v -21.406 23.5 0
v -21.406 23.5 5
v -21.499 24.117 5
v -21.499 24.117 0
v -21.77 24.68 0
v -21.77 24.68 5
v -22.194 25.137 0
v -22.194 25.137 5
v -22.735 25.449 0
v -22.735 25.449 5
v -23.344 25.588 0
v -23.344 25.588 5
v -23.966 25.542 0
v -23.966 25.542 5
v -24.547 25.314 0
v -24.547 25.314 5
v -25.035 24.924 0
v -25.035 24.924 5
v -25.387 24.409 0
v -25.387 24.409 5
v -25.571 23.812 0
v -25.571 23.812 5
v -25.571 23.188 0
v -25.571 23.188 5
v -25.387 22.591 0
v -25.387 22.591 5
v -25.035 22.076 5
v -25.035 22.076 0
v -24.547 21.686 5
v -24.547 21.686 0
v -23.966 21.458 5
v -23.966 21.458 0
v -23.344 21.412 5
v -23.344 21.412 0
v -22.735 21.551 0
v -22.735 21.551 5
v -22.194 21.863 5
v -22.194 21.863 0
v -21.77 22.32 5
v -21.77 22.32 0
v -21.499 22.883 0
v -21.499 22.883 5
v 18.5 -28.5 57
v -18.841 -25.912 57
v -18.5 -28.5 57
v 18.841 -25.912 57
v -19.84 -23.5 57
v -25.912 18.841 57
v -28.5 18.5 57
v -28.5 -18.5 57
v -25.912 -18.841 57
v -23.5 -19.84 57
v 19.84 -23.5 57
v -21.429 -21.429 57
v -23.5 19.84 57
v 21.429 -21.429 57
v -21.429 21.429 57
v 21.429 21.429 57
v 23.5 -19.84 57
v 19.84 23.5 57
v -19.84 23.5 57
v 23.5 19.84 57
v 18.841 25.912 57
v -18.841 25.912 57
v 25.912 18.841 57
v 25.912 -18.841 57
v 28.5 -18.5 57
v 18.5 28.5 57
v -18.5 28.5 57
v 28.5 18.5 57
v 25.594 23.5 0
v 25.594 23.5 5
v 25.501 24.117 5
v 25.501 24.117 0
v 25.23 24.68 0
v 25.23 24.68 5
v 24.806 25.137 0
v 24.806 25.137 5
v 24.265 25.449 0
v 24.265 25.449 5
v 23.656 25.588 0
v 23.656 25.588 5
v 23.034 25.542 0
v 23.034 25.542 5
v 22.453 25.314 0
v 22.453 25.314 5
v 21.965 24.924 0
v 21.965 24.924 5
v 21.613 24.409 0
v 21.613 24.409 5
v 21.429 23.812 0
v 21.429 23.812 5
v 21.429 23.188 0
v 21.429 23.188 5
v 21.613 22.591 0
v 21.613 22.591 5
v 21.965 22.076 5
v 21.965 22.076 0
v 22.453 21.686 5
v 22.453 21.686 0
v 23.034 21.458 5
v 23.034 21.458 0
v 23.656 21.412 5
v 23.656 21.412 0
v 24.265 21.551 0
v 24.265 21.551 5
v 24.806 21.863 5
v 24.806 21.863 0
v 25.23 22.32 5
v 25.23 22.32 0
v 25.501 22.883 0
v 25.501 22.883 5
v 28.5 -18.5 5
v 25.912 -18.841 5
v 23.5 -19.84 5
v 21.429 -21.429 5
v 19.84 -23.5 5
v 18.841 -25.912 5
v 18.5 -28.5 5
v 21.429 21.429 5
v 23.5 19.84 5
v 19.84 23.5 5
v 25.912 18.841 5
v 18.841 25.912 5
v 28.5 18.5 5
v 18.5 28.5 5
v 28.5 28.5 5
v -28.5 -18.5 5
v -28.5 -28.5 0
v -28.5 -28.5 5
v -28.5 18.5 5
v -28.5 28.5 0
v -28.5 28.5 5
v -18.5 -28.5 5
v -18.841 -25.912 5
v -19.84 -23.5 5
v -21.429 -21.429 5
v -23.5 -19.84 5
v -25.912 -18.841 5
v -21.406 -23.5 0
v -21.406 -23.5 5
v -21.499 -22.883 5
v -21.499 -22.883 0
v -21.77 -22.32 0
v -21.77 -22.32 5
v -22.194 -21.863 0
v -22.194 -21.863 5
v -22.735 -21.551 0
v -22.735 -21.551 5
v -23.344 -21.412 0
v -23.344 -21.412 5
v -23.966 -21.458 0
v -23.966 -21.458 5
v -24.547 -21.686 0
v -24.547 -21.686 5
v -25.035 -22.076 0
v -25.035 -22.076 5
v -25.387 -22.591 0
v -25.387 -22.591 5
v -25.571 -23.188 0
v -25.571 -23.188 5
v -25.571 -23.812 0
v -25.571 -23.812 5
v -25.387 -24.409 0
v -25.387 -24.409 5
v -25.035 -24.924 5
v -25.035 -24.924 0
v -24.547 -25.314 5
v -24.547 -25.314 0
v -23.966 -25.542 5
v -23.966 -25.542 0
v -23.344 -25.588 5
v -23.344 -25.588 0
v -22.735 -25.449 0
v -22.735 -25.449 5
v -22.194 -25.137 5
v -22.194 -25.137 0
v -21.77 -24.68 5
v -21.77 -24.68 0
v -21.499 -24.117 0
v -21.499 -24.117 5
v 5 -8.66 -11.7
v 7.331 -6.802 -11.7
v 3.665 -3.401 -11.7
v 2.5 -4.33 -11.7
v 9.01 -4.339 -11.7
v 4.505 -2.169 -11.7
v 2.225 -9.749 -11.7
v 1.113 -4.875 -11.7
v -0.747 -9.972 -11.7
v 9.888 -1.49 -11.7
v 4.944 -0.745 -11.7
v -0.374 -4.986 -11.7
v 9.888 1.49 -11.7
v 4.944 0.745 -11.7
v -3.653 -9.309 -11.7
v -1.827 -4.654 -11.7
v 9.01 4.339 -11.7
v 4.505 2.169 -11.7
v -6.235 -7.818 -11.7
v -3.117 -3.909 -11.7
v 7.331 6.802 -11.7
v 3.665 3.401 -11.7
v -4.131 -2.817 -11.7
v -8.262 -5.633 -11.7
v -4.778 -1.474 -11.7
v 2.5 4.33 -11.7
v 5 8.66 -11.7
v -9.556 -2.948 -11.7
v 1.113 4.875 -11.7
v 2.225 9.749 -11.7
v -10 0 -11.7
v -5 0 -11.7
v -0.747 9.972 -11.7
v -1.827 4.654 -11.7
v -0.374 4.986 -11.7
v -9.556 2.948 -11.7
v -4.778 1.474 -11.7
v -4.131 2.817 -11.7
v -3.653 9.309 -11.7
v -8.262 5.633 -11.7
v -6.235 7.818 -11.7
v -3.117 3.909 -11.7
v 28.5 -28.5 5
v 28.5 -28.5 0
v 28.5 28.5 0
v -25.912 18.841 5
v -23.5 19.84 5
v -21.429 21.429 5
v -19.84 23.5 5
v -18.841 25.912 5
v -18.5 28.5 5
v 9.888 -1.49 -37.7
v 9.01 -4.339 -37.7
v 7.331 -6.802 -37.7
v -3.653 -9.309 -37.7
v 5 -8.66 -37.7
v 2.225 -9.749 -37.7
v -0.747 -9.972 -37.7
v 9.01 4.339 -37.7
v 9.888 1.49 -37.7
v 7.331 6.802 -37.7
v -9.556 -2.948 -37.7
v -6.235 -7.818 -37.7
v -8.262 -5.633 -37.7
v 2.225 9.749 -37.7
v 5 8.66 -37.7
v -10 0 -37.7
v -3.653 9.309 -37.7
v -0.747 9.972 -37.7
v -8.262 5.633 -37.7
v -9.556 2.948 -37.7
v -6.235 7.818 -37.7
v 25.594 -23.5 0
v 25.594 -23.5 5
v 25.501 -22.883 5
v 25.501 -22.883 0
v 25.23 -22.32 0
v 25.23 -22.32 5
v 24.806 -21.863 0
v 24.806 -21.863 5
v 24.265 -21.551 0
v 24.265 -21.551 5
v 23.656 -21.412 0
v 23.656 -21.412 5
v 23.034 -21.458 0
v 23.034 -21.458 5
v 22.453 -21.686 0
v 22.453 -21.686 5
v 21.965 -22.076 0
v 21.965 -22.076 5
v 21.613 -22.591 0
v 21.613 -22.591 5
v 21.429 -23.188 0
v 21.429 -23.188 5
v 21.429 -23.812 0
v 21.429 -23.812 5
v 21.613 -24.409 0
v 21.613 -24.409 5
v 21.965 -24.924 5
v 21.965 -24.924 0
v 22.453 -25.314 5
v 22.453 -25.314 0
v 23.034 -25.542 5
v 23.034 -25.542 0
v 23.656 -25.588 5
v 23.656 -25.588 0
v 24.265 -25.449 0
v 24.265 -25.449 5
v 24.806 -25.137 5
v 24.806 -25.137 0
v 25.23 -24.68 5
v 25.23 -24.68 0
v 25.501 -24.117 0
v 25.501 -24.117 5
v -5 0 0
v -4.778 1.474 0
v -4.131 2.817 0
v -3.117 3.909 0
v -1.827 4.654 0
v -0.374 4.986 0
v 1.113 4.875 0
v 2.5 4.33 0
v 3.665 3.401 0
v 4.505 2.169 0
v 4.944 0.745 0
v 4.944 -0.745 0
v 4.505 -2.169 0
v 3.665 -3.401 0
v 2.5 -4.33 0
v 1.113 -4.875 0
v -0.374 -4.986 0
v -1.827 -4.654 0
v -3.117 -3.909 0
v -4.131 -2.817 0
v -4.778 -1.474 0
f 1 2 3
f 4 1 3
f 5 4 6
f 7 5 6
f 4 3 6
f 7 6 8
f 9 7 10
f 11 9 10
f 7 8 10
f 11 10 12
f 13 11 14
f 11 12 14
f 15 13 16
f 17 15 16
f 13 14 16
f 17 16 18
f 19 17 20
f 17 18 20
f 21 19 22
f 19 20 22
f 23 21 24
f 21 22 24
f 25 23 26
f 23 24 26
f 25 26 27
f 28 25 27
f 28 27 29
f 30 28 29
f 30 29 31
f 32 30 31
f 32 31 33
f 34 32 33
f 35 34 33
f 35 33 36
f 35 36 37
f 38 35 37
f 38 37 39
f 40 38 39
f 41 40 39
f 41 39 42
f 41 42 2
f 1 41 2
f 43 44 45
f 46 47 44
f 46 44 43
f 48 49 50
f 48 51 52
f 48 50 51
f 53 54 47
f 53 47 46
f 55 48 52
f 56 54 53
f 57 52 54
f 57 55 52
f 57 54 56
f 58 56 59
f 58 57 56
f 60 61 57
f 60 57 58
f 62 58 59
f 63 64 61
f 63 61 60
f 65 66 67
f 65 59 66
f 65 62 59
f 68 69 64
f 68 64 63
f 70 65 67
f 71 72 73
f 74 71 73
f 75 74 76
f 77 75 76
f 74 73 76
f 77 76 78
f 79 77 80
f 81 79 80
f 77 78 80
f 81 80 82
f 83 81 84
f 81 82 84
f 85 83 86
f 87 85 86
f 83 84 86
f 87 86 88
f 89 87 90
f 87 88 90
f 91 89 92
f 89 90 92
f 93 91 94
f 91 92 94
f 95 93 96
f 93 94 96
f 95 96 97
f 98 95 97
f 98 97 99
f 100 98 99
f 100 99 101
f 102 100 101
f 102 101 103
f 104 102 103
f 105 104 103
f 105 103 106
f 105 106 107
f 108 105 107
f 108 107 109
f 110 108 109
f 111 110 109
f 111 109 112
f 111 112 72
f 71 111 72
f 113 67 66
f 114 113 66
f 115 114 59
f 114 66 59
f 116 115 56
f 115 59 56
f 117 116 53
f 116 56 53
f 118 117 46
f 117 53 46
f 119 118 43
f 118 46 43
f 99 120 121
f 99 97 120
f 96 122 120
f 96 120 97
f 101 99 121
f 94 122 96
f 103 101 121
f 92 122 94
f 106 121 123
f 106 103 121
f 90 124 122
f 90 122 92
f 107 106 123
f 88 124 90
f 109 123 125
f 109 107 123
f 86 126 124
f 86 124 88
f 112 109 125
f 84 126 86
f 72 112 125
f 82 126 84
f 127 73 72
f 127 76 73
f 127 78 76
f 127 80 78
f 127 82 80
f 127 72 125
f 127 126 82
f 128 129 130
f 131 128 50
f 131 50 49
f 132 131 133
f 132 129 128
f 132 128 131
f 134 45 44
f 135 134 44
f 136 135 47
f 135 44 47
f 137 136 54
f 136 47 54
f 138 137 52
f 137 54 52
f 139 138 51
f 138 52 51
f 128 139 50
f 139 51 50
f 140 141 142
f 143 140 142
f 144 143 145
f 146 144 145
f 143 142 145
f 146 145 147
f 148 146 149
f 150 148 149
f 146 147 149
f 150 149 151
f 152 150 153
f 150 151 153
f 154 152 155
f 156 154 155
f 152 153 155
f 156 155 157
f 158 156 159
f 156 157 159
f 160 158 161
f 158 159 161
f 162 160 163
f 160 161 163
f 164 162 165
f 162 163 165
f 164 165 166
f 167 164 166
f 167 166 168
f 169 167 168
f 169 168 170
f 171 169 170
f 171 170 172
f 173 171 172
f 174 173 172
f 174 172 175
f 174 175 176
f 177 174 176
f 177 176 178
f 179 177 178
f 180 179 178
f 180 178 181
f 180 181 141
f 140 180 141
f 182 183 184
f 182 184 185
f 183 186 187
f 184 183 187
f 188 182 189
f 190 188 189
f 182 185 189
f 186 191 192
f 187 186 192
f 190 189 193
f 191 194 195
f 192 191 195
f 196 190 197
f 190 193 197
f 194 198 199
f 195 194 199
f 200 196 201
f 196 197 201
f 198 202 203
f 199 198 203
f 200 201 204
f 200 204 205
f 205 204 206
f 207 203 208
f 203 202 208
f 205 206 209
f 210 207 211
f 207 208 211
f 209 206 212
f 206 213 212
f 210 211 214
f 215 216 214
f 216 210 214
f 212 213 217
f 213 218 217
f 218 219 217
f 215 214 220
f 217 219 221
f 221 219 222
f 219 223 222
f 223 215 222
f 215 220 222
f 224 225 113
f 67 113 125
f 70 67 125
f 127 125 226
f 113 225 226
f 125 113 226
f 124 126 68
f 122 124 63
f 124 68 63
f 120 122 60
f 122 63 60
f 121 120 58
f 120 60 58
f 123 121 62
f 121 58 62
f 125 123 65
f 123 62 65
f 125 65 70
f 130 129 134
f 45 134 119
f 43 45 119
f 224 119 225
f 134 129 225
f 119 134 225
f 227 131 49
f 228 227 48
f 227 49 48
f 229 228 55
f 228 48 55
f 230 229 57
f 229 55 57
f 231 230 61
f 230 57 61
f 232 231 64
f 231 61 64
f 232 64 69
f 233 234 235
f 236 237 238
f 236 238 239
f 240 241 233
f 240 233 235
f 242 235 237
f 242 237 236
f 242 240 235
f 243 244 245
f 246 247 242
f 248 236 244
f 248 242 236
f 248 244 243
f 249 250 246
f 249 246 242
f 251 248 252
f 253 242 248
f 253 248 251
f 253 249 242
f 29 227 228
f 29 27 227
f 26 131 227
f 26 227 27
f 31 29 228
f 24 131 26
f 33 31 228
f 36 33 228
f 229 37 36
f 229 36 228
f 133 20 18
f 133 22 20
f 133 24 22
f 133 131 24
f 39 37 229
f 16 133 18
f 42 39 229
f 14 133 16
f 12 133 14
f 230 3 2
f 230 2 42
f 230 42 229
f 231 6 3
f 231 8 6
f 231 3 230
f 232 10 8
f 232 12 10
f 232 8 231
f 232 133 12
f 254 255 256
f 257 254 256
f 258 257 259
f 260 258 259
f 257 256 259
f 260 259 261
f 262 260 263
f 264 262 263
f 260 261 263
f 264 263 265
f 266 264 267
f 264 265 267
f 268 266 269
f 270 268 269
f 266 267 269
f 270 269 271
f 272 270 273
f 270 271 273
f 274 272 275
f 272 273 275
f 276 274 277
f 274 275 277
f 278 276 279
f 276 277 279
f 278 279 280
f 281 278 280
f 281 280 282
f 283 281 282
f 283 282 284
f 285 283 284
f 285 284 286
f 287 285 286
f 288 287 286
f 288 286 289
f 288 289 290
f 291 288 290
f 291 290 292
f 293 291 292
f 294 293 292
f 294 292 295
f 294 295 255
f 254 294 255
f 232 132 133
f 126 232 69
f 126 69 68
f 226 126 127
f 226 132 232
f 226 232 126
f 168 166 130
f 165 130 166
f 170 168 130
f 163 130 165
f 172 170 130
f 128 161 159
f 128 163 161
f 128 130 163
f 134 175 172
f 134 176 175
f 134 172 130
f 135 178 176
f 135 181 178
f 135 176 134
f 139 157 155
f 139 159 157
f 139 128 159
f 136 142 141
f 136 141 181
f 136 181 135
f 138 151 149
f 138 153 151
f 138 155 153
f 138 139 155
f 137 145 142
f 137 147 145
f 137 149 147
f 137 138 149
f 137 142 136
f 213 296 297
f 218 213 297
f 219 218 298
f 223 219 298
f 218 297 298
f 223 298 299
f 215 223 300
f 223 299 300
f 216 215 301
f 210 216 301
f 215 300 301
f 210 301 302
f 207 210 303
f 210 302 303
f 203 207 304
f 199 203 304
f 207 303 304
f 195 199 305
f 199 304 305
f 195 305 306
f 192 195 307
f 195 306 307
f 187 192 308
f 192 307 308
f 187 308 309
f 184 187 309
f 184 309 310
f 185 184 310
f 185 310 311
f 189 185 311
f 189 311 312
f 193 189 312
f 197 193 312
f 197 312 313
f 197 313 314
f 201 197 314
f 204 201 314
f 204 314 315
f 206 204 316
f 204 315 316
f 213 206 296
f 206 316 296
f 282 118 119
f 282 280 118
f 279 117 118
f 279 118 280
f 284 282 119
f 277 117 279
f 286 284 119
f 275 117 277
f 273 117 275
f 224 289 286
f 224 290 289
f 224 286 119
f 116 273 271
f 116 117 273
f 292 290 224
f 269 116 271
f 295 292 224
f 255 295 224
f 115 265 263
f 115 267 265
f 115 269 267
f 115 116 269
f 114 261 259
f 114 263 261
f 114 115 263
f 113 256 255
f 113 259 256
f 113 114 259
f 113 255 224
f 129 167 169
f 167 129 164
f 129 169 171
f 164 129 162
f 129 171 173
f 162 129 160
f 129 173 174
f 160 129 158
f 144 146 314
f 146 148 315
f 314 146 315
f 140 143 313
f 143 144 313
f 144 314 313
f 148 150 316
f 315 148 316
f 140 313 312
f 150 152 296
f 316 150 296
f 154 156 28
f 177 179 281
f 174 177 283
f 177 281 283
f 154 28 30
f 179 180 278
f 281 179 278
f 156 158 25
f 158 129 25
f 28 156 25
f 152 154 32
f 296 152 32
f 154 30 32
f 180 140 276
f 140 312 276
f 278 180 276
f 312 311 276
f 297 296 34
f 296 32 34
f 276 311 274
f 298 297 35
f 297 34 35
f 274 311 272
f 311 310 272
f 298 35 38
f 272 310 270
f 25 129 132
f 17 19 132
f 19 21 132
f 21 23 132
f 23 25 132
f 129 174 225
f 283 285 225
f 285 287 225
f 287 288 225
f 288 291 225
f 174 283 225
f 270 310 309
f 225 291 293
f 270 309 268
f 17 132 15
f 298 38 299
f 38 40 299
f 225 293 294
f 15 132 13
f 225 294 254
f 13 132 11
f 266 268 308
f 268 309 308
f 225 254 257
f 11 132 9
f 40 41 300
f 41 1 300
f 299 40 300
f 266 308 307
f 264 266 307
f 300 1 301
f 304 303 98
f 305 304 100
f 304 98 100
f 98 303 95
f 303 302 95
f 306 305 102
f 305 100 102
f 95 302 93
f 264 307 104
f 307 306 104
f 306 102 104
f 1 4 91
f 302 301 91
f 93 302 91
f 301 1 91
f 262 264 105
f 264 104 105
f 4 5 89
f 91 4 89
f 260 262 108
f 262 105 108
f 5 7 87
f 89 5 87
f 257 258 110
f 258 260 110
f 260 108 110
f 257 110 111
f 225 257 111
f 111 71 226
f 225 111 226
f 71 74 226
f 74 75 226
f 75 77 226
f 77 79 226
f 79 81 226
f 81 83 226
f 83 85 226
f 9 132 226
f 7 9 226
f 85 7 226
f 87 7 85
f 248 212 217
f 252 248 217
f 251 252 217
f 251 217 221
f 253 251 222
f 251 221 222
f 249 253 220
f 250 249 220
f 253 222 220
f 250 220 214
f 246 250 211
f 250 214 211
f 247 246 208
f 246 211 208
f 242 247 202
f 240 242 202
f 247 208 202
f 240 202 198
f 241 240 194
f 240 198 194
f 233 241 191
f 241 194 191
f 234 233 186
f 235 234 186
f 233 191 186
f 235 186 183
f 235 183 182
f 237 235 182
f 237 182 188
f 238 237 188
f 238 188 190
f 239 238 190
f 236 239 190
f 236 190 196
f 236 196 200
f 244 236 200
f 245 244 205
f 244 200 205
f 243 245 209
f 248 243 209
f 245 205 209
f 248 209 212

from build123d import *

# Parameters (mm, degrees)
SKETCH_1_W          = 57
SKETCH_1_H          = 57
EXTRUDE_1_DEPTH     = 57
SKETCH_2_R          = 10
CUT_EXTRUDE_1_DEPTH = 52
SKETCH_3_R          = 2.094139209
CUT_EXTRUDE_3_DEPTH = 6
SKETCH_4_R          = 5
EXTRUDE_3_DEPTH     = 11.7
SKETCH_5_R          = 10
EXTRUDE_4_DEPTH     = 26


with BuildPart() as part:
    # 草图1 → 凸台-拉伸1 (new body)
    with BuildSketch(Plane.XY):
        Rectangle(SKETCH_1_W, SKETCH_1_H)
    extrude(amount=EXTRUDE_1_DEPTH)

    # 草图2 → 切除-拉伸1 (cut)
    with BuildSketch(Plane.XY.offset(57)):
        with Locations((28.5, 28.5)):
            Circle(SKETCH_2_R)
        with Locations((-28.5, 28.5)):
            Circle(SKETCH_2_R)
        with Locations((28.5, -28.5)):
            Circle(SKETCH_2_R)
        with Locations((-28.5, -28.5)):
            Circle(SKETCH_2_R)
    extrude(amount=-CUT_EXTRUDE_1_DEPTH, mode=Mode.SUBTRACT)

    # 草图3 → 切除-拉伸3 (cut, through all)
    with BuildSketch(Plane.XY.offset(5)):
        with Locations((23.5, -23.5)):
            Circle(SKETCH_3_R)
        with Locations((-23.5, -23.5)):
            Circle(SKETCH_3_R)
        with Locations((-23.5, 23.5)):
            Circle(SKETCH_3_R)
        with Locations((23.5, 23.5)):
            Circle(SKETCH_3_R)
    extrude(amount=-CUT_EXTRUDE_3_DEPTH, mode=Mode.SUBTRACT)

    # 草图4 → 凸台-拉伸3 (add)
    with BuildSketch(Plane(origin=(0, 0, 0), x_dir=(-1, 0, 0), z_dir=(0, 0, -1))):
        Circle(SKETCH_4_R)
    extrude(amount=EXTRUDE_3_DEPTH)

    # 草图5 → 凸台-拉伸4 (add)
    with BuildSketch(Plane(origin=(0, 0, -11.7), x_dir=(-1, 0, 0), z_dir=(0, 0, -1))):
        Circle(SKETCH_5_R)
    extrude(amount=EXTRUDE_4_DEPTH)


solid = part.part
